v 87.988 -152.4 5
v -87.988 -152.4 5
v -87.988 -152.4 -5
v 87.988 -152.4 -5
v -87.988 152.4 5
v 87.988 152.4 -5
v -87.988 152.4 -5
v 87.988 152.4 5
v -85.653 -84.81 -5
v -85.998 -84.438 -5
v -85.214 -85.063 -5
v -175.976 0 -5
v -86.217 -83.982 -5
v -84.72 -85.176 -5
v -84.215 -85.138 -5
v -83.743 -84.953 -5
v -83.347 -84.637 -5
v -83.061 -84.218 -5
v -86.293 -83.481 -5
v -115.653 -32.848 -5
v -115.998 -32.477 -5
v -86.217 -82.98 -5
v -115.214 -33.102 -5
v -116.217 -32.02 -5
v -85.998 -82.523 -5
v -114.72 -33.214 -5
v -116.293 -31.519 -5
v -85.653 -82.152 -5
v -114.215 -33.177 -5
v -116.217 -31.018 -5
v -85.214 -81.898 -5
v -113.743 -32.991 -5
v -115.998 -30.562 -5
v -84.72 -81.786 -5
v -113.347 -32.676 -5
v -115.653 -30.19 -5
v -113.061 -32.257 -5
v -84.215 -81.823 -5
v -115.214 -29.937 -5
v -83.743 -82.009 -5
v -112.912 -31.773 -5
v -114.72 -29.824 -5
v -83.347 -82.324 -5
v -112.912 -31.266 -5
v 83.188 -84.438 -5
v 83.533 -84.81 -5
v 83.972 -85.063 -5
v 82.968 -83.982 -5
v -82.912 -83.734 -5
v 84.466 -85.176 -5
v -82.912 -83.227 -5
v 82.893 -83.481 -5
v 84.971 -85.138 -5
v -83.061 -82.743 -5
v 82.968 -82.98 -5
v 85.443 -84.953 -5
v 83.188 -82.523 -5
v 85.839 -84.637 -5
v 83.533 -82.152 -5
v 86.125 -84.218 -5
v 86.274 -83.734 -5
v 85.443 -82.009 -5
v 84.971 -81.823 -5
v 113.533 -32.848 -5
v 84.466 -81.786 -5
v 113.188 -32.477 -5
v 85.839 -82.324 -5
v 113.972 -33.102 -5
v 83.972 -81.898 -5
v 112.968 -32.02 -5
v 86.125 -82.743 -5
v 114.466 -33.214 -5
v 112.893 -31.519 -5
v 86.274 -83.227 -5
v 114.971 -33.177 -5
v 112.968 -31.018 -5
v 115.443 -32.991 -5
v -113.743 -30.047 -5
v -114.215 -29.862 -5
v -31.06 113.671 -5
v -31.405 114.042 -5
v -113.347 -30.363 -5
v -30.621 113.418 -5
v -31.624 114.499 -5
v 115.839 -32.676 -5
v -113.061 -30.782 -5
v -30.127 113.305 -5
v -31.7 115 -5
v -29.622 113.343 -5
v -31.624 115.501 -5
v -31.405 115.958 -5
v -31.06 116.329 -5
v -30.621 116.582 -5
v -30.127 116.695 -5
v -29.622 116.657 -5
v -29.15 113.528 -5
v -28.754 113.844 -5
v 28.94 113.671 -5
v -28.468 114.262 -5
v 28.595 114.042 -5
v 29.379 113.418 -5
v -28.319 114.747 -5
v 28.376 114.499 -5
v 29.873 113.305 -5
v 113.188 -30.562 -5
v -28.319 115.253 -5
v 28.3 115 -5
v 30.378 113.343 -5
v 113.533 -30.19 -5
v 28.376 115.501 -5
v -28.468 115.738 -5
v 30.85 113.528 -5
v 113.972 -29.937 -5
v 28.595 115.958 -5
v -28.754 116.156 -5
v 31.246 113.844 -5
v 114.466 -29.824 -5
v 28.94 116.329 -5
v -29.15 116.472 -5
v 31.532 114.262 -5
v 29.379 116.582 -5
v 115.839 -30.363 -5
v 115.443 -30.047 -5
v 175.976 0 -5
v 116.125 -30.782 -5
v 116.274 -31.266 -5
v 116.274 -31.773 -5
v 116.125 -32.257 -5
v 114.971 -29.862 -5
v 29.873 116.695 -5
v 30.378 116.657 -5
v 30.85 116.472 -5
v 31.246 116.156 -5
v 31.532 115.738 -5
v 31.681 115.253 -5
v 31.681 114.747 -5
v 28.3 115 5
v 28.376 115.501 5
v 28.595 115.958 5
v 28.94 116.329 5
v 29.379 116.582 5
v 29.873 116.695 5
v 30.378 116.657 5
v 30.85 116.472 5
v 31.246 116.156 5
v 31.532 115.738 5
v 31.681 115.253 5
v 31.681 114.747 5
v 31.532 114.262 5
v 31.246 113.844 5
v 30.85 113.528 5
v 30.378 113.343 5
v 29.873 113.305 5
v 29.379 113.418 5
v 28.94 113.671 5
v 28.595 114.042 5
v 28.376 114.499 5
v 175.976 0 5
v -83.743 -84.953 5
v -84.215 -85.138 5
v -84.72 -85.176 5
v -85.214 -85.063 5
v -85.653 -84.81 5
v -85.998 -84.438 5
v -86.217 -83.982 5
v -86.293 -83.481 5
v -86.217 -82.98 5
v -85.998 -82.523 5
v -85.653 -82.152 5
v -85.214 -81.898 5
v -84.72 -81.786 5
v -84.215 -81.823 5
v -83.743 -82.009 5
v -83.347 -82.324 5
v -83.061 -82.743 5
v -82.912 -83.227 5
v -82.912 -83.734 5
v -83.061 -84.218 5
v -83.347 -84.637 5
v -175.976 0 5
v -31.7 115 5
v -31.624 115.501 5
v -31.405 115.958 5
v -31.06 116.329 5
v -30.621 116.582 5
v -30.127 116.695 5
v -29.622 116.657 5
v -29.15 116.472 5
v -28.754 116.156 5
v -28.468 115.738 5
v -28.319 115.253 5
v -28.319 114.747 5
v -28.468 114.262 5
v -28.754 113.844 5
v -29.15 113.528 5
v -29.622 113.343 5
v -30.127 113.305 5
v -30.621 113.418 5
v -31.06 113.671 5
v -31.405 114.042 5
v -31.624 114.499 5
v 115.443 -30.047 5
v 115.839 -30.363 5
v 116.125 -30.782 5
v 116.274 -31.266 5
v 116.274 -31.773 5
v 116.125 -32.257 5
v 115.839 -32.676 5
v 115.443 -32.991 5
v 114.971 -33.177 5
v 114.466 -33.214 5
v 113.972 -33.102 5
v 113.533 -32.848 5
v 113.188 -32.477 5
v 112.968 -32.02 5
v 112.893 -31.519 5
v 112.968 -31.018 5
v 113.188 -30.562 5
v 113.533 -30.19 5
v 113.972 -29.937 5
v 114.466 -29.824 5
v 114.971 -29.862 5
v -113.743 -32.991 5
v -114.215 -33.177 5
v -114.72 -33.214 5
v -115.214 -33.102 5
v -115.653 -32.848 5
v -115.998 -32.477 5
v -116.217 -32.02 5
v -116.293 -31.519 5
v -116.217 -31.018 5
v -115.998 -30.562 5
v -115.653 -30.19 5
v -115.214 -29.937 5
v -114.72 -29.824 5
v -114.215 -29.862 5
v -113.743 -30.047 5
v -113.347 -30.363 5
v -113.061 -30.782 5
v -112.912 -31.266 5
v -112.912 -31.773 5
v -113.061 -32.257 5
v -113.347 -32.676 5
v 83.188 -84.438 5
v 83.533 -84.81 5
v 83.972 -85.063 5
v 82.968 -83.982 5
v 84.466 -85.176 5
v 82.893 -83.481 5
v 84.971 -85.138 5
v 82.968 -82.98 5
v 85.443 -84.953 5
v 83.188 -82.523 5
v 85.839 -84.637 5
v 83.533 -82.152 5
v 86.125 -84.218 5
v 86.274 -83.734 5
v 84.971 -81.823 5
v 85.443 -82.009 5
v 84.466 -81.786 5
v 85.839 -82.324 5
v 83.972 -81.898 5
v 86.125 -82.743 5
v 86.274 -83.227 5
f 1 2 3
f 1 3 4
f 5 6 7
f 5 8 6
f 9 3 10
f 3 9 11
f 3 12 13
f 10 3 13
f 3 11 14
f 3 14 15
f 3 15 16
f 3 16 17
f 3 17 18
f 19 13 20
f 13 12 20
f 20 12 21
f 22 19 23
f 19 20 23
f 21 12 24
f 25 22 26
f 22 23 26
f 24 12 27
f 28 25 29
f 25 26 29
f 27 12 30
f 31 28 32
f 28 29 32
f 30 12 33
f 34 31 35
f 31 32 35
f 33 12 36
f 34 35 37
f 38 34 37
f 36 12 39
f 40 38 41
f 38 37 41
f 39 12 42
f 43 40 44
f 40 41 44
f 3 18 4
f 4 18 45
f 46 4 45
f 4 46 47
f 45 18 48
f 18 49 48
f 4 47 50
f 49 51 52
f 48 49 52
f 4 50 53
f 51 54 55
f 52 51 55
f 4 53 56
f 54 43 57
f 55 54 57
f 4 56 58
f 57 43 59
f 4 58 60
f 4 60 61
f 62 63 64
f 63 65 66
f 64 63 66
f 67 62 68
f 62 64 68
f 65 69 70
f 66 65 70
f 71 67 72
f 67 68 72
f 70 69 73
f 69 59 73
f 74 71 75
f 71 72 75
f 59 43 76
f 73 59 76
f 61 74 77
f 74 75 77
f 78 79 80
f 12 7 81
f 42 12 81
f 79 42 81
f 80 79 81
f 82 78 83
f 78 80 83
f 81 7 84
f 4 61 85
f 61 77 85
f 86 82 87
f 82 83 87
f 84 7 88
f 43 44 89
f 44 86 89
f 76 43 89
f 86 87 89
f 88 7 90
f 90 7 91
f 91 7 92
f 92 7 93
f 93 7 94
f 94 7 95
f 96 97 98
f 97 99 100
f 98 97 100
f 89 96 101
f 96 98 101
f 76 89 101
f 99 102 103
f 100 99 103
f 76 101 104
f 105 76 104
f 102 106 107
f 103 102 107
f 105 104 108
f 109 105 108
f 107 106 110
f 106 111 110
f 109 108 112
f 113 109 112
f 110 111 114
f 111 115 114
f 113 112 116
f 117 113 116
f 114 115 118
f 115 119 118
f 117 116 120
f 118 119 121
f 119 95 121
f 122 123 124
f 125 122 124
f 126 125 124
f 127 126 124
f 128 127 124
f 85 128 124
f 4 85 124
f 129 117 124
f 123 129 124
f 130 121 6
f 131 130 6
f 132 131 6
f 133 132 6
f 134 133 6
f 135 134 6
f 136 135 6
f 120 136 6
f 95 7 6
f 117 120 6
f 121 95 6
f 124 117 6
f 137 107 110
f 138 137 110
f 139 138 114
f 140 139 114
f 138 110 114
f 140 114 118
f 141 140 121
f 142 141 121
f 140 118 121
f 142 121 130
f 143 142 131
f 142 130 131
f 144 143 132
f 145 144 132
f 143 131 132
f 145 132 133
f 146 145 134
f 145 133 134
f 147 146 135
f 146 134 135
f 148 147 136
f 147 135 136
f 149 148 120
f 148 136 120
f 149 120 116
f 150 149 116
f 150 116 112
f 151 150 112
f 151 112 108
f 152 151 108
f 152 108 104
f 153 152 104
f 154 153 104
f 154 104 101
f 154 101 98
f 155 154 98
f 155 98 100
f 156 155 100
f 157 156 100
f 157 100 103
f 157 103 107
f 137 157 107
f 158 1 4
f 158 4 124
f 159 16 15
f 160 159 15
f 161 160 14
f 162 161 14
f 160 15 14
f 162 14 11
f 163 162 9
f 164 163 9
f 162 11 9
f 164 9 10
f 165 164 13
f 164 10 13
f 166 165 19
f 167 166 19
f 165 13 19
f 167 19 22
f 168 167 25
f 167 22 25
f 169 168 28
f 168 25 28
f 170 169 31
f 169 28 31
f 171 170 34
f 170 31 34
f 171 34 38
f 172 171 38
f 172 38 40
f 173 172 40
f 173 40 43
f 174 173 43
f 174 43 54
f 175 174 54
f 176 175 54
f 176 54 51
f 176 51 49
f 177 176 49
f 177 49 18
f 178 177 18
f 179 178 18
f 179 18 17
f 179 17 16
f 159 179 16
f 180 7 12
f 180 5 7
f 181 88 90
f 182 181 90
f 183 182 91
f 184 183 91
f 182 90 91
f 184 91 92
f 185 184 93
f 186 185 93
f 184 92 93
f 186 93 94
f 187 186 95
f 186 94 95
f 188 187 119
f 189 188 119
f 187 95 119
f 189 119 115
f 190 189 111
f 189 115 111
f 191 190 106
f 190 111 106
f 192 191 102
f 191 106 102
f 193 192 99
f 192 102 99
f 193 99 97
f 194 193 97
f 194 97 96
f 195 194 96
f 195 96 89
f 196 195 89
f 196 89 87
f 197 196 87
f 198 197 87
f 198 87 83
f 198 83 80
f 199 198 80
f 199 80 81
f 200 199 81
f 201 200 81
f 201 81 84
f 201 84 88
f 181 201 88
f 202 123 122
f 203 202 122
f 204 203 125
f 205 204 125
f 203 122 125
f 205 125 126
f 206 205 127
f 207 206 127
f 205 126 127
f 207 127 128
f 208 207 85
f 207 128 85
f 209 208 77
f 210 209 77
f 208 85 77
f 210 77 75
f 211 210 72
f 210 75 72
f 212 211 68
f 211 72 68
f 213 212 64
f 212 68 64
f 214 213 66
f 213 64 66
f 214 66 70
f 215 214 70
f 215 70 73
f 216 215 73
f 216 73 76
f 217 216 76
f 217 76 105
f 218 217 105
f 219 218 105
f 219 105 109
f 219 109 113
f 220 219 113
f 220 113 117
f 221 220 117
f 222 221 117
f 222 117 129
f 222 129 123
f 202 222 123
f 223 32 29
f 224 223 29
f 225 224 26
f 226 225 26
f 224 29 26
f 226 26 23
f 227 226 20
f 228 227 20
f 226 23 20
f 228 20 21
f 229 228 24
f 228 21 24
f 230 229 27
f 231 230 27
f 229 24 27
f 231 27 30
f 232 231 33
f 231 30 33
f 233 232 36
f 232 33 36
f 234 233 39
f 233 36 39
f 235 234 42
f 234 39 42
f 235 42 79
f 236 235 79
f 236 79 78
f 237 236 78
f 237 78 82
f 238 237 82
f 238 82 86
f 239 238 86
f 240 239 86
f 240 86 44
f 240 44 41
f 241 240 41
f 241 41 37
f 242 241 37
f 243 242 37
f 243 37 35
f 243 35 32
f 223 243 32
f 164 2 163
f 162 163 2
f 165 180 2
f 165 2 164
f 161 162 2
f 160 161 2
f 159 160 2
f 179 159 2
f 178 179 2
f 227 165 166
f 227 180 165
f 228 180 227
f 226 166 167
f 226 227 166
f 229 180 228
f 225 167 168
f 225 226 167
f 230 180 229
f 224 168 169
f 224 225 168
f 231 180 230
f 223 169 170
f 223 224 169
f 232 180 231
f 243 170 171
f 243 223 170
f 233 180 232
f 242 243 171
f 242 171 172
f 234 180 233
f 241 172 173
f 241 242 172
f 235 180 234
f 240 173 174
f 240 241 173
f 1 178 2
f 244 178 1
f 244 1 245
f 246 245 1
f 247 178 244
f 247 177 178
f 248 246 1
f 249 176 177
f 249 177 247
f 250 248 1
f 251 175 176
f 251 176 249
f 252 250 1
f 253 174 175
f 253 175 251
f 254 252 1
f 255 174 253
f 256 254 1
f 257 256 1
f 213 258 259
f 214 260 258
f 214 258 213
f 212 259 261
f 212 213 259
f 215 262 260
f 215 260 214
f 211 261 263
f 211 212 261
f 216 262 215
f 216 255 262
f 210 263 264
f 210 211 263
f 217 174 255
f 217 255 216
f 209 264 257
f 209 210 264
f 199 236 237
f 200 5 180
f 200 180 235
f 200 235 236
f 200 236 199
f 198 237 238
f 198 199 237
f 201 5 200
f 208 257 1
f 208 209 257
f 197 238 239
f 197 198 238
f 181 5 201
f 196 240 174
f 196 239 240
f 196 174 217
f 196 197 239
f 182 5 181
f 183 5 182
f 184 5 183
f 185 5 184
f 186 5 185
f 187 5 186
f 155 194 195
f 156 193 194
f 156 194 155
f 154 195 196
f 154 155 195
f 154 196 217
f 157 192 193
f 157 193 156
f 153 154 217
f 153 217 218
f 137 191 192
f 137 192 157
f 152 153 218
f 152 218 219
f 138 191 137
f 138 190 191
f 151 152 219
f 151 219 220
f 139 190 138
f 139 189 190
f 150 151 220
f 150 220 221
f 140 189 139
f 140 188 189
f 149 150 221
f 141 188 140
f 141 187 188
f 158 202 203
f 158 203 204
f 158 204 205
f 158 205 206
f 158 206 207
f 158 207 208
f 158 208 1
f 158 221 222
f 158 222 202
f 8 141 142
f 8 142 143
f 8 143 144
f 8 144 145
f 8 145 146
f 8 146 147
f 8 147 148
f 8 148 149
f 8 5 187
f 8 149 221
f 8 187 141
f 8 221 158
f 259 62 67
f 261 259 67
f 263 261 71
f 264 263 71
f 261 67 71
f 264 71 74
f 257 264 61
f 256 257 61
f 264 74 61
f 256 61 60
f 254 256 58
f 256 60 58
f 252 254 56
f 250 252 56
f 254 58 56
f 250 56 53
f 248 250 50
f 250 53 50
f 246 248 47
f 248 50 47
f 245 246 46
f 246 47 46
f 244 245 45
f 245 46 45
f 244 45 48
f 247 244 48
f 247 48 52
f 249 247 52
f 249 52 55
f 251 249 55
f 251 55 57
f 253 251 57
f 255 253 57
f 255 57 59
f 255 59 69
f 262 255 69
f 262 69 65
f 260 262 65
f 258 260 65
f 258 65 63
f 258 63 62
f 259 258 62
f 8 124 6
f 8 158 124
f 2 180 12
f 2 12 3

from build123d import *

# Parameters (mm, degrees)
BOSS_EXTRUDE1_DEPTH  = 5
M3_CLEARANCE_HOLE1_D = 3.4
CIRPATTERN1_COUNT    = 3


with BuildPart() as part:
    # Sketch2 → Boss-Extrude1 (new, symmetric)
    with BuildSketch(Plane.XY):
        Polygon((-87.988181024, 152.4), (-175.976362049, 0), (-87.988181024, -152.4), (87.988181024, -152.4), (175.976362049, 0), (87.988181024, 152.4), align=None)
    extrude(amount=BOSS_EXTRUDE1_DEPTH, both=True)

    # M3 Clearance Hole1 (through all)
    with Locations(Plane.XY.offset(5)):
        with Locations((-30.000000001, 115), (30.000000001, 115)):
            m3_clearance_hole1 = Hole(M3_CLEARANCE_HOLE1_D / 2)

    # CirPattern1: M3 Clearance Hole1 ×3 about axis
    cirpattern1_axis = Axis((0, 0, -20.250000596), (0, 0, 1))
    for i in range(1, CIRPATTERN1_COUNT):
        add(m3_clearance_hole1.rotate(cirpattern1_axis, i * 360 / CIRPATTERN1_COUNT), mode=Mode.SUBTRACT)


solid = part.part
